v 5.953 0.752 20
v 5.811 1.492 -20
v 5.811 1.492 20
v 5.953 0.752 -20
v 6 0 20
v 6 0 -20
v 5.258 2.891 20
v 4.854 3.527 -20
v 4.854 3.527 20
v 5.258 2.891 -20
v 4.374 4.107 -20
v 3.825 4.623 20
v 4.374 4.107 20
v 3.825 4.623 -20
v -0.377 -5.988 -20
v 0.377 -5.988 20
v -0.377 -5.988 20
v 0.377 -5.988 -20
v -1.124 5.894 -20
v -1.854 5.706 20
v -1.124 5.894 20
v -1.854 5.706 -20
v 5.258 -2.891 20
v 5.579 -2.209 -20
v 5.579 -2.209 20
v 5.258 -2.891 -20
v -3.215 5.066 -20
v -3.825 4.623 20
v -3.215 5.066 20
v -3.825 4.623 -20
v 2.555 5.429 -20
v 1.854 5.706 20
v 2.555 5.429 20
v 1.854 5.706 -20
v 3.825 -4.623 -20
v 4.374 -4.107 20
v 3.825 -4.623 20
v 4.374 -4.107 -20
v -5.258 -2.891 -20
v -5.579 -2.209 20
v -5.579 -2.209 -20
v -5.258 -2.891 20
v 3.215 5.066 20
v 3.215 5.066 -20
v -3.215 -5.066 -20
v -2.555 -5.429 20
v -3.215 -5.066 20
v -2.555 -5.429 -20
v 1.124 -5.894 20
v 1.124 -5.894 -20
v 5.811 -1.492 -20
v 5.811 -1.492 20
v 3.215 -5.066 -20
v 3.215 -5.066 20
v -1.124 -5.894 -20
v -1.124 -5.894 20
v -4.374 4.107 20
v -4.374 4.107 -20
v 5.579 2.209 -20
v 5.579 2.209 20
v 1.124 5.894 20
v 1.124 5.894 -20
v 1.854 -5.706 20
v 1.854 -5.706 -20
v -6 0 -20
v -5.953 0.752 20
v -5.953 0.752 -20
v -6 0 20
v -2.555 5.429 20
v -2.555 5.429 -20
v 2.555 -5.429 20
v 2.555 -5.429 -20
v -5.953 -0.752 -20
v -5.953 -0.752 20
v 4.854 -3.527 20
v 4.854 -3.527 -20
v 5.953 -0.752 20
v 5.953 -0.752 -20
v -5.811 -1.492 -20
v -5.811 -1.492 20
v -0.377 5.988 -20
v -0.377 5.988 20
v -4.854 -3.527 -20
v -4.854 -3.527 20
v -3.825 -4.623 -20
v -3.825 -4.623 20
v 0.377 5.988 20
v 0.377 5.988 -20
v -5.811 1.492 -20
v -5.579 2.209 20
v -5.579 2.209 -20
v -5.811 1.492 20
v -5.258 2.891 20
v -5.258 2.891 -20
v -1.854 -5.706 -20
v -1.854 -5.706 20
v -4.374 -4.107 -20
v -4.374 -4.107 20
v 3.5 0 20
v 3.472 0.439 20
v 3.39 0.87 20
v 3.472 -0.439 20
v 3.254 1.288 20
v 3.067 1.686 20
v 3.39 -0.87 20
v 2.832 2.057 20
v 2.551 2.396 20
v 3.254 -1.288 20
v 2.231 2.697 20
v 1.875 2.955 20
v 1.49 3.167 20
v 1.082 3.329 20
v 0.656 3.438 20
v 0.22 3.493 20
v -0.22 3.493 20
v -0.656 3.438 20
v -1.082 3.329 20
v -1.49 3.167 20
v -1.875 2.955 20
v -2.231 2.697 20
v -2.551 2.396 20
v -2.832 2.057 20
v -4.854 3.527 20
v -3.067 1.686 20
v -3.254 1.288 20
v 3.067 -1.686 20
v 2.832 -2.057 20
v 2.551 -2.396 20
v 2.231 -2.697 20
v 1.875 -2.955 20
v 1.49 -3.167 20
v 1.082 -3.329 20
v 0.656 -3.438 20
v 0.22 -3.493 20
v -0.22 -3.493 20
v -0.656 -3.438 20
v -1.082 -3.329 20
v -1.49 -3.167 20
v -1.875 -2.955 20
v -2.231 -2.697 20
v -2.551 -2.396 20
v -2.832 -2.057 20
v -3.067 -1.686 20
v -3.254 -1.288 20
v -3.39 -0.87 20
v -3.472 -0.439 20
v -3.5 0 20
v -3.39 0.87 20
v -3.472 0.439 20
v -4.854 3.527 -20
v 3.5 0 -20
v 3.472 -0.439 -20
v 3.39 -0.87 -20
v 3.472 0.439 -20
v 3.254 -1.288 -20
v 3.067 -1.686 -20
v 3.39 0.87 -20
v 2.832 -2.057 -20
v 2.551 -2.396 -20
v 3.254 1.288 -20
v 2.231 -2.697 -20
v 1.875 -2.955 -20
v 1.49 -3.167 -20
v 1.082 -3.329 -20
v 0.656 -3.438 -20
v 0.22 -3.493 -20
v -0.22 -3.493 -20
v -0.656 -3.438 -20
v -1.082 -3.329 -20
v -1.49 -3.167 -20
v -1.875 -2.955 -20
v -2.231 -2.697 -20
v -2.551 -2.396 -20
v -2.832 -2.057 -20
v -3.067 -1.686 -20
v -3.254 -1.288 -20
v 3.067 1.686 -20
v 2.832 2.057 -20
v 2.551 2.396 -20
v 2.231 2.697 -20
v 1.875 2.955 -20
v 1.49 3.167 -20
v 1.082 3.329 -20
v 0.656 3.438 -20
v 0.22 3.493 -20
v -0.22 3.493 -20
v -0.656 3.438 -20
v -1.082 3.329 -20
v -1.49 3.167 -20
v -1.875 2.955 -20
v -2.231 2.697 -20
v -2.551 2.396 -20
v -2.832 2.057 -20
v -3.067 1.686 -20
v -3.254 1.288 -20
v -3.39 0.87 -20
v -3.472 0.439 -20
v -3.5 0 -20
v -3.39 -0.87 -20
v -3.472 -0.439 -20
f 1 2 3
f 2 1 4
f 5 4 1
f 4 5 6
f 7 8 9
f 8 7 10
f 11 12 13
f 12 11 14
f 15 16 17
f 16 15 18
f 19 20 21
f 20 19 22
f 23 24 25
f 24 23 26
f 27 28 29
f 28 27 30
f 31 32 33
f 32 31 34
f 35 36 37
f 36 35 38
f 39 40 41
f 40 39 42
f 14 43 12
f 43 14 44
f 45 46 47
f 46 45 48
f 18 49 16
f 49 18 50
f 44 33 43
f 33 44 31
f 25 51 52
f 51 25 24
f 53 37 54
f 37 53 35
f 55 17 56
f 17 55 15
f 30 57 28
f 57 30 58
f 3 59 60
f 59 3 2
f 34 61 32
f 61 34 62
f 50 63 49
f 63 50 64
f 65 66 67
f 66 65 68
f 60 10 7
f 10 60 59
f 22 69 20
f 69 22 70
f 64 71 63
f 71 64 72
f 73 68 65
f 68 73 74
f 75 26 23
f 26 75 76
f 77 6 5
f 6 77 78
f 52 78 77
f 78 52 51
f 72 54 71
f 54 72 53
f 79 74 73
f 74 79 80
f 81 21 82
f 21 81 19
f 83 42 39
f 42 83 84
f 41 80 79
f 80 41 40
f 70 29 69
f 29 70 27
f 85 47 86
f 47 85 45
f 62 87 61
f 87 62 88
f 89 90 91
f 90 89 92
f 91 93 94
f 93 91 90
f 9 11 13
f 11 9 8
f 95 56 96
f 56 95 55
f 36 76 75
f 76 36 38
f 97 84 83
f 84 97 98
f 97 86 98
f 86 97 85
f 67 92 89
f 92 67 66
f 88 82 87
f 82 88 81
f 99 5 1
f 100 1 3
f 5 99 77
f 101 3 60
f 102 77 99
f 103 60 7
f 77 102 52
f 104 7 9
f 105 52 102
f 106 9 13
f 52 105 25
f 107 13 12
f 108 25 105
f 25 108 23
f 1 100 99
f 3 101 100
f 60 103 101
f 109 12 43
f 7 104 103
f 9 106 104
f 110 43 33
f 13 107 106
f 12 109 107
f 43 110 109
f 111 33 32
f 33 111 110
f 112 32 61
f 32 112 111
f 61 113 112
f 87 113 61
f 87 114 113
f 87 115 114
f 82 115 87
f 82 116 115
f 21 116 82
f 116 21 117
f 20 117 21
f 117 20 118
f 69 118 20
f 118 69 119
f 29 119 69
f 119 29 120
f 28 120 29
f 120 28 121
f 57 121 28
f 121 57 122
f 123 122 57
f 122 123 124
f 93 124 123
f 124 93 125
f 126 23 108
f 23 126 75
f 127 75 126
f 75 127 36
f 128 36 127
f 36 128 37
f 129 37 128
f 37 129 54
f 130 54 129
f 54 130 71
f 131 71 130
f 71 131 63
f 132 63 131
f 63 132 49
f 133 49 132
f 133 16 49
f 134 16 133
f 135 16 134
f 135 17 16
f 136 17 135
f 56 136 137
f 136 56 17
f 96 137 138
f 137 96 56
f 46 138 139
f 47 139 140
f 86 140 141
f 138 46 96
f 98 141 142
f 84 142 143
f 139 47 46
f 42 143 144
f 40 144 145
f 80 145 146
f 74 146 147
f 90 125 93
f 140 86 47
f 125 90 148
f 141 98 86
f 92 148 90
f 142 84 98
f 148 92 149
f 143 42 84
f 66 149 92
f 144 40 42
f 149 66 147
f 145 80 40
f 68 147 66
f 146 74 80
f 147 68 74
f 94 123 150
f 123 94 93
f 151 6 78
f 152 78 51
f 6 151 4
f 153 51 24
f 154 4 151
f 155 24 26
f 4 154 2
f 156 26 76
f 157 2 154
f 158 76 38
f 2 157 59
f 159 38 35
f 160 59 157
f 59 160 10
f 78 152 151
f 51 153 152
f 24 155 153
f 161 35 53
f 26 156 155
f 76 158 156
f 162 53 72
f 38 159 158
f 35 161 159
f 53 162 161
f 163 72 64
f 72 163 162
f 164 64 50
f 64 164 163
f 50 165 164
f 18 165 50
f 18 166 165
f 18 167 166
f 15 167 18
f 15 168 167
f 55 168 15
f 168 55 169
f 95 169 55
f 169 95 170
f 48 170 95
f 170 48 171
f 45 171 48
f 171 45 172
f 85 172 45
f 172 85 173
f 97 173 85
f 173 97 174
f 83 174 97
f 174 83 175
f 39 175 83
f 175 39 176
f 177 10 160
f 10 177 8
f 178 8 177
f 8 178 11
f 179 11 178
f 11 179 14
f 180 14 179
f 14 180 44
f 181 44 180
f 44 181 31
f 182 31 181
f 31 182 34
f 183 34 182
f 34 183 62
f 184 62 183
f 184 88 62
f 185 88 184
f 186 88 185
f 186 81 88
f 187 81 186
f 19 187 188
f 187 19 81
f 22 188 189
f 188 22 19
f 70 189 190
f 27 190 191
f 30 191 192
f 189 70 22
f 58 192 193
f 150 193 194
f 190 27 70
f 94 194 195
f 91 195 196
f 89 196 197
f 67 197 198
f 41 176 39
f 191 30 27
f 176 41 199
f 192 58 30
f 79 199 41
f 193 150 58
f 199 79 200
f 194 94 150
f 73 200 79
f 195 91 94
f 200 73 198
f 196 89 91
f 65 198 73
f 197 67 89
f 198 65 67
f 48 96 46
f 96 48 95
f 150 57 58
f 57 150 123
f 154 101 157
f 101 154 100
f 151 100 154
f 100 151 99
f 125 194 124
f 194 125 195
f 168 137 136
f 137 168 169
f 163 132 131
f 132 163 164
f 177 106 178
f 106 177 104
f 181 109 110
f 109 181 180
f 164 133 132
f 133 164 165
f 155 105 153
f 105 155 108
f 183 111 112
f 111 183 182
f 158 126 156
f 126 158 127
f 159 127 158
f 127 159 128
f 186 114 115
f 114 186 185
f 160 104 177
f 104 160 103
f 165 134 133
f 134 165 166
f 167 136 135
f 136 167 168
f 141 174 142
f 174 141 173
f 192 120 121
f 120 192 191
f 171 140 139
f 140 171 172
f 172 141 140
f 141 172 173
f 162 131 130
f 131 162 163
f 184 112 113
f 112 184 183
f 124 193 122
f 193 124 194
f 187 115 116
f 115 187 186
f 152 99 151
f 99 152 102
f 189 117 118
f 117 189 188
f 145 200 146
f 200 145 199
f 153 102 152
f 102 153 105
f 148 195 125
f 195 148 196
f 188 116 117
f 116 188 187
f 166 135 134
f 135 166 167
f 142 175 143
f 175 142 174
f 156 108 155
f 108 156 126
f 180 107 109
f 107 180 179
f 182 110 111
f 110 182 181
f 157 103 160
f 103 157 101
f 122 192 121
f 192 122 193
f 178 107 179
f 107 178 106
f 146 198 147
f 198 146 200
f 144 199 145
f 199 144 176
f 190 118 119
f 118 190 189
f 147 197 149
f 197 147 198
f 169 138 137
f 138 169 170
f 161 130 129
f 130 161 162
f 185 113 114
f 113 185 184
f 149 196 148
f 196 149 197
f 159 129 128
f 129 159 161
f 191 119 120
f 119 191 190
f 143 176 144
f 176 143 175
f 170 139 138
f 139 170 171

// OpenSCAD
$fn = 50;


difference() {
	union() {
		translate(v = [0, 0, -20.0000000000]) {
			cylinder(h = 40, r = 6.0000000000);
		}
	}
	union() {
		translate(v = [0, 0, -100.0000000000]) {
			cylinder(h = 200, r = 3.5000000000);
		}
	}
}
